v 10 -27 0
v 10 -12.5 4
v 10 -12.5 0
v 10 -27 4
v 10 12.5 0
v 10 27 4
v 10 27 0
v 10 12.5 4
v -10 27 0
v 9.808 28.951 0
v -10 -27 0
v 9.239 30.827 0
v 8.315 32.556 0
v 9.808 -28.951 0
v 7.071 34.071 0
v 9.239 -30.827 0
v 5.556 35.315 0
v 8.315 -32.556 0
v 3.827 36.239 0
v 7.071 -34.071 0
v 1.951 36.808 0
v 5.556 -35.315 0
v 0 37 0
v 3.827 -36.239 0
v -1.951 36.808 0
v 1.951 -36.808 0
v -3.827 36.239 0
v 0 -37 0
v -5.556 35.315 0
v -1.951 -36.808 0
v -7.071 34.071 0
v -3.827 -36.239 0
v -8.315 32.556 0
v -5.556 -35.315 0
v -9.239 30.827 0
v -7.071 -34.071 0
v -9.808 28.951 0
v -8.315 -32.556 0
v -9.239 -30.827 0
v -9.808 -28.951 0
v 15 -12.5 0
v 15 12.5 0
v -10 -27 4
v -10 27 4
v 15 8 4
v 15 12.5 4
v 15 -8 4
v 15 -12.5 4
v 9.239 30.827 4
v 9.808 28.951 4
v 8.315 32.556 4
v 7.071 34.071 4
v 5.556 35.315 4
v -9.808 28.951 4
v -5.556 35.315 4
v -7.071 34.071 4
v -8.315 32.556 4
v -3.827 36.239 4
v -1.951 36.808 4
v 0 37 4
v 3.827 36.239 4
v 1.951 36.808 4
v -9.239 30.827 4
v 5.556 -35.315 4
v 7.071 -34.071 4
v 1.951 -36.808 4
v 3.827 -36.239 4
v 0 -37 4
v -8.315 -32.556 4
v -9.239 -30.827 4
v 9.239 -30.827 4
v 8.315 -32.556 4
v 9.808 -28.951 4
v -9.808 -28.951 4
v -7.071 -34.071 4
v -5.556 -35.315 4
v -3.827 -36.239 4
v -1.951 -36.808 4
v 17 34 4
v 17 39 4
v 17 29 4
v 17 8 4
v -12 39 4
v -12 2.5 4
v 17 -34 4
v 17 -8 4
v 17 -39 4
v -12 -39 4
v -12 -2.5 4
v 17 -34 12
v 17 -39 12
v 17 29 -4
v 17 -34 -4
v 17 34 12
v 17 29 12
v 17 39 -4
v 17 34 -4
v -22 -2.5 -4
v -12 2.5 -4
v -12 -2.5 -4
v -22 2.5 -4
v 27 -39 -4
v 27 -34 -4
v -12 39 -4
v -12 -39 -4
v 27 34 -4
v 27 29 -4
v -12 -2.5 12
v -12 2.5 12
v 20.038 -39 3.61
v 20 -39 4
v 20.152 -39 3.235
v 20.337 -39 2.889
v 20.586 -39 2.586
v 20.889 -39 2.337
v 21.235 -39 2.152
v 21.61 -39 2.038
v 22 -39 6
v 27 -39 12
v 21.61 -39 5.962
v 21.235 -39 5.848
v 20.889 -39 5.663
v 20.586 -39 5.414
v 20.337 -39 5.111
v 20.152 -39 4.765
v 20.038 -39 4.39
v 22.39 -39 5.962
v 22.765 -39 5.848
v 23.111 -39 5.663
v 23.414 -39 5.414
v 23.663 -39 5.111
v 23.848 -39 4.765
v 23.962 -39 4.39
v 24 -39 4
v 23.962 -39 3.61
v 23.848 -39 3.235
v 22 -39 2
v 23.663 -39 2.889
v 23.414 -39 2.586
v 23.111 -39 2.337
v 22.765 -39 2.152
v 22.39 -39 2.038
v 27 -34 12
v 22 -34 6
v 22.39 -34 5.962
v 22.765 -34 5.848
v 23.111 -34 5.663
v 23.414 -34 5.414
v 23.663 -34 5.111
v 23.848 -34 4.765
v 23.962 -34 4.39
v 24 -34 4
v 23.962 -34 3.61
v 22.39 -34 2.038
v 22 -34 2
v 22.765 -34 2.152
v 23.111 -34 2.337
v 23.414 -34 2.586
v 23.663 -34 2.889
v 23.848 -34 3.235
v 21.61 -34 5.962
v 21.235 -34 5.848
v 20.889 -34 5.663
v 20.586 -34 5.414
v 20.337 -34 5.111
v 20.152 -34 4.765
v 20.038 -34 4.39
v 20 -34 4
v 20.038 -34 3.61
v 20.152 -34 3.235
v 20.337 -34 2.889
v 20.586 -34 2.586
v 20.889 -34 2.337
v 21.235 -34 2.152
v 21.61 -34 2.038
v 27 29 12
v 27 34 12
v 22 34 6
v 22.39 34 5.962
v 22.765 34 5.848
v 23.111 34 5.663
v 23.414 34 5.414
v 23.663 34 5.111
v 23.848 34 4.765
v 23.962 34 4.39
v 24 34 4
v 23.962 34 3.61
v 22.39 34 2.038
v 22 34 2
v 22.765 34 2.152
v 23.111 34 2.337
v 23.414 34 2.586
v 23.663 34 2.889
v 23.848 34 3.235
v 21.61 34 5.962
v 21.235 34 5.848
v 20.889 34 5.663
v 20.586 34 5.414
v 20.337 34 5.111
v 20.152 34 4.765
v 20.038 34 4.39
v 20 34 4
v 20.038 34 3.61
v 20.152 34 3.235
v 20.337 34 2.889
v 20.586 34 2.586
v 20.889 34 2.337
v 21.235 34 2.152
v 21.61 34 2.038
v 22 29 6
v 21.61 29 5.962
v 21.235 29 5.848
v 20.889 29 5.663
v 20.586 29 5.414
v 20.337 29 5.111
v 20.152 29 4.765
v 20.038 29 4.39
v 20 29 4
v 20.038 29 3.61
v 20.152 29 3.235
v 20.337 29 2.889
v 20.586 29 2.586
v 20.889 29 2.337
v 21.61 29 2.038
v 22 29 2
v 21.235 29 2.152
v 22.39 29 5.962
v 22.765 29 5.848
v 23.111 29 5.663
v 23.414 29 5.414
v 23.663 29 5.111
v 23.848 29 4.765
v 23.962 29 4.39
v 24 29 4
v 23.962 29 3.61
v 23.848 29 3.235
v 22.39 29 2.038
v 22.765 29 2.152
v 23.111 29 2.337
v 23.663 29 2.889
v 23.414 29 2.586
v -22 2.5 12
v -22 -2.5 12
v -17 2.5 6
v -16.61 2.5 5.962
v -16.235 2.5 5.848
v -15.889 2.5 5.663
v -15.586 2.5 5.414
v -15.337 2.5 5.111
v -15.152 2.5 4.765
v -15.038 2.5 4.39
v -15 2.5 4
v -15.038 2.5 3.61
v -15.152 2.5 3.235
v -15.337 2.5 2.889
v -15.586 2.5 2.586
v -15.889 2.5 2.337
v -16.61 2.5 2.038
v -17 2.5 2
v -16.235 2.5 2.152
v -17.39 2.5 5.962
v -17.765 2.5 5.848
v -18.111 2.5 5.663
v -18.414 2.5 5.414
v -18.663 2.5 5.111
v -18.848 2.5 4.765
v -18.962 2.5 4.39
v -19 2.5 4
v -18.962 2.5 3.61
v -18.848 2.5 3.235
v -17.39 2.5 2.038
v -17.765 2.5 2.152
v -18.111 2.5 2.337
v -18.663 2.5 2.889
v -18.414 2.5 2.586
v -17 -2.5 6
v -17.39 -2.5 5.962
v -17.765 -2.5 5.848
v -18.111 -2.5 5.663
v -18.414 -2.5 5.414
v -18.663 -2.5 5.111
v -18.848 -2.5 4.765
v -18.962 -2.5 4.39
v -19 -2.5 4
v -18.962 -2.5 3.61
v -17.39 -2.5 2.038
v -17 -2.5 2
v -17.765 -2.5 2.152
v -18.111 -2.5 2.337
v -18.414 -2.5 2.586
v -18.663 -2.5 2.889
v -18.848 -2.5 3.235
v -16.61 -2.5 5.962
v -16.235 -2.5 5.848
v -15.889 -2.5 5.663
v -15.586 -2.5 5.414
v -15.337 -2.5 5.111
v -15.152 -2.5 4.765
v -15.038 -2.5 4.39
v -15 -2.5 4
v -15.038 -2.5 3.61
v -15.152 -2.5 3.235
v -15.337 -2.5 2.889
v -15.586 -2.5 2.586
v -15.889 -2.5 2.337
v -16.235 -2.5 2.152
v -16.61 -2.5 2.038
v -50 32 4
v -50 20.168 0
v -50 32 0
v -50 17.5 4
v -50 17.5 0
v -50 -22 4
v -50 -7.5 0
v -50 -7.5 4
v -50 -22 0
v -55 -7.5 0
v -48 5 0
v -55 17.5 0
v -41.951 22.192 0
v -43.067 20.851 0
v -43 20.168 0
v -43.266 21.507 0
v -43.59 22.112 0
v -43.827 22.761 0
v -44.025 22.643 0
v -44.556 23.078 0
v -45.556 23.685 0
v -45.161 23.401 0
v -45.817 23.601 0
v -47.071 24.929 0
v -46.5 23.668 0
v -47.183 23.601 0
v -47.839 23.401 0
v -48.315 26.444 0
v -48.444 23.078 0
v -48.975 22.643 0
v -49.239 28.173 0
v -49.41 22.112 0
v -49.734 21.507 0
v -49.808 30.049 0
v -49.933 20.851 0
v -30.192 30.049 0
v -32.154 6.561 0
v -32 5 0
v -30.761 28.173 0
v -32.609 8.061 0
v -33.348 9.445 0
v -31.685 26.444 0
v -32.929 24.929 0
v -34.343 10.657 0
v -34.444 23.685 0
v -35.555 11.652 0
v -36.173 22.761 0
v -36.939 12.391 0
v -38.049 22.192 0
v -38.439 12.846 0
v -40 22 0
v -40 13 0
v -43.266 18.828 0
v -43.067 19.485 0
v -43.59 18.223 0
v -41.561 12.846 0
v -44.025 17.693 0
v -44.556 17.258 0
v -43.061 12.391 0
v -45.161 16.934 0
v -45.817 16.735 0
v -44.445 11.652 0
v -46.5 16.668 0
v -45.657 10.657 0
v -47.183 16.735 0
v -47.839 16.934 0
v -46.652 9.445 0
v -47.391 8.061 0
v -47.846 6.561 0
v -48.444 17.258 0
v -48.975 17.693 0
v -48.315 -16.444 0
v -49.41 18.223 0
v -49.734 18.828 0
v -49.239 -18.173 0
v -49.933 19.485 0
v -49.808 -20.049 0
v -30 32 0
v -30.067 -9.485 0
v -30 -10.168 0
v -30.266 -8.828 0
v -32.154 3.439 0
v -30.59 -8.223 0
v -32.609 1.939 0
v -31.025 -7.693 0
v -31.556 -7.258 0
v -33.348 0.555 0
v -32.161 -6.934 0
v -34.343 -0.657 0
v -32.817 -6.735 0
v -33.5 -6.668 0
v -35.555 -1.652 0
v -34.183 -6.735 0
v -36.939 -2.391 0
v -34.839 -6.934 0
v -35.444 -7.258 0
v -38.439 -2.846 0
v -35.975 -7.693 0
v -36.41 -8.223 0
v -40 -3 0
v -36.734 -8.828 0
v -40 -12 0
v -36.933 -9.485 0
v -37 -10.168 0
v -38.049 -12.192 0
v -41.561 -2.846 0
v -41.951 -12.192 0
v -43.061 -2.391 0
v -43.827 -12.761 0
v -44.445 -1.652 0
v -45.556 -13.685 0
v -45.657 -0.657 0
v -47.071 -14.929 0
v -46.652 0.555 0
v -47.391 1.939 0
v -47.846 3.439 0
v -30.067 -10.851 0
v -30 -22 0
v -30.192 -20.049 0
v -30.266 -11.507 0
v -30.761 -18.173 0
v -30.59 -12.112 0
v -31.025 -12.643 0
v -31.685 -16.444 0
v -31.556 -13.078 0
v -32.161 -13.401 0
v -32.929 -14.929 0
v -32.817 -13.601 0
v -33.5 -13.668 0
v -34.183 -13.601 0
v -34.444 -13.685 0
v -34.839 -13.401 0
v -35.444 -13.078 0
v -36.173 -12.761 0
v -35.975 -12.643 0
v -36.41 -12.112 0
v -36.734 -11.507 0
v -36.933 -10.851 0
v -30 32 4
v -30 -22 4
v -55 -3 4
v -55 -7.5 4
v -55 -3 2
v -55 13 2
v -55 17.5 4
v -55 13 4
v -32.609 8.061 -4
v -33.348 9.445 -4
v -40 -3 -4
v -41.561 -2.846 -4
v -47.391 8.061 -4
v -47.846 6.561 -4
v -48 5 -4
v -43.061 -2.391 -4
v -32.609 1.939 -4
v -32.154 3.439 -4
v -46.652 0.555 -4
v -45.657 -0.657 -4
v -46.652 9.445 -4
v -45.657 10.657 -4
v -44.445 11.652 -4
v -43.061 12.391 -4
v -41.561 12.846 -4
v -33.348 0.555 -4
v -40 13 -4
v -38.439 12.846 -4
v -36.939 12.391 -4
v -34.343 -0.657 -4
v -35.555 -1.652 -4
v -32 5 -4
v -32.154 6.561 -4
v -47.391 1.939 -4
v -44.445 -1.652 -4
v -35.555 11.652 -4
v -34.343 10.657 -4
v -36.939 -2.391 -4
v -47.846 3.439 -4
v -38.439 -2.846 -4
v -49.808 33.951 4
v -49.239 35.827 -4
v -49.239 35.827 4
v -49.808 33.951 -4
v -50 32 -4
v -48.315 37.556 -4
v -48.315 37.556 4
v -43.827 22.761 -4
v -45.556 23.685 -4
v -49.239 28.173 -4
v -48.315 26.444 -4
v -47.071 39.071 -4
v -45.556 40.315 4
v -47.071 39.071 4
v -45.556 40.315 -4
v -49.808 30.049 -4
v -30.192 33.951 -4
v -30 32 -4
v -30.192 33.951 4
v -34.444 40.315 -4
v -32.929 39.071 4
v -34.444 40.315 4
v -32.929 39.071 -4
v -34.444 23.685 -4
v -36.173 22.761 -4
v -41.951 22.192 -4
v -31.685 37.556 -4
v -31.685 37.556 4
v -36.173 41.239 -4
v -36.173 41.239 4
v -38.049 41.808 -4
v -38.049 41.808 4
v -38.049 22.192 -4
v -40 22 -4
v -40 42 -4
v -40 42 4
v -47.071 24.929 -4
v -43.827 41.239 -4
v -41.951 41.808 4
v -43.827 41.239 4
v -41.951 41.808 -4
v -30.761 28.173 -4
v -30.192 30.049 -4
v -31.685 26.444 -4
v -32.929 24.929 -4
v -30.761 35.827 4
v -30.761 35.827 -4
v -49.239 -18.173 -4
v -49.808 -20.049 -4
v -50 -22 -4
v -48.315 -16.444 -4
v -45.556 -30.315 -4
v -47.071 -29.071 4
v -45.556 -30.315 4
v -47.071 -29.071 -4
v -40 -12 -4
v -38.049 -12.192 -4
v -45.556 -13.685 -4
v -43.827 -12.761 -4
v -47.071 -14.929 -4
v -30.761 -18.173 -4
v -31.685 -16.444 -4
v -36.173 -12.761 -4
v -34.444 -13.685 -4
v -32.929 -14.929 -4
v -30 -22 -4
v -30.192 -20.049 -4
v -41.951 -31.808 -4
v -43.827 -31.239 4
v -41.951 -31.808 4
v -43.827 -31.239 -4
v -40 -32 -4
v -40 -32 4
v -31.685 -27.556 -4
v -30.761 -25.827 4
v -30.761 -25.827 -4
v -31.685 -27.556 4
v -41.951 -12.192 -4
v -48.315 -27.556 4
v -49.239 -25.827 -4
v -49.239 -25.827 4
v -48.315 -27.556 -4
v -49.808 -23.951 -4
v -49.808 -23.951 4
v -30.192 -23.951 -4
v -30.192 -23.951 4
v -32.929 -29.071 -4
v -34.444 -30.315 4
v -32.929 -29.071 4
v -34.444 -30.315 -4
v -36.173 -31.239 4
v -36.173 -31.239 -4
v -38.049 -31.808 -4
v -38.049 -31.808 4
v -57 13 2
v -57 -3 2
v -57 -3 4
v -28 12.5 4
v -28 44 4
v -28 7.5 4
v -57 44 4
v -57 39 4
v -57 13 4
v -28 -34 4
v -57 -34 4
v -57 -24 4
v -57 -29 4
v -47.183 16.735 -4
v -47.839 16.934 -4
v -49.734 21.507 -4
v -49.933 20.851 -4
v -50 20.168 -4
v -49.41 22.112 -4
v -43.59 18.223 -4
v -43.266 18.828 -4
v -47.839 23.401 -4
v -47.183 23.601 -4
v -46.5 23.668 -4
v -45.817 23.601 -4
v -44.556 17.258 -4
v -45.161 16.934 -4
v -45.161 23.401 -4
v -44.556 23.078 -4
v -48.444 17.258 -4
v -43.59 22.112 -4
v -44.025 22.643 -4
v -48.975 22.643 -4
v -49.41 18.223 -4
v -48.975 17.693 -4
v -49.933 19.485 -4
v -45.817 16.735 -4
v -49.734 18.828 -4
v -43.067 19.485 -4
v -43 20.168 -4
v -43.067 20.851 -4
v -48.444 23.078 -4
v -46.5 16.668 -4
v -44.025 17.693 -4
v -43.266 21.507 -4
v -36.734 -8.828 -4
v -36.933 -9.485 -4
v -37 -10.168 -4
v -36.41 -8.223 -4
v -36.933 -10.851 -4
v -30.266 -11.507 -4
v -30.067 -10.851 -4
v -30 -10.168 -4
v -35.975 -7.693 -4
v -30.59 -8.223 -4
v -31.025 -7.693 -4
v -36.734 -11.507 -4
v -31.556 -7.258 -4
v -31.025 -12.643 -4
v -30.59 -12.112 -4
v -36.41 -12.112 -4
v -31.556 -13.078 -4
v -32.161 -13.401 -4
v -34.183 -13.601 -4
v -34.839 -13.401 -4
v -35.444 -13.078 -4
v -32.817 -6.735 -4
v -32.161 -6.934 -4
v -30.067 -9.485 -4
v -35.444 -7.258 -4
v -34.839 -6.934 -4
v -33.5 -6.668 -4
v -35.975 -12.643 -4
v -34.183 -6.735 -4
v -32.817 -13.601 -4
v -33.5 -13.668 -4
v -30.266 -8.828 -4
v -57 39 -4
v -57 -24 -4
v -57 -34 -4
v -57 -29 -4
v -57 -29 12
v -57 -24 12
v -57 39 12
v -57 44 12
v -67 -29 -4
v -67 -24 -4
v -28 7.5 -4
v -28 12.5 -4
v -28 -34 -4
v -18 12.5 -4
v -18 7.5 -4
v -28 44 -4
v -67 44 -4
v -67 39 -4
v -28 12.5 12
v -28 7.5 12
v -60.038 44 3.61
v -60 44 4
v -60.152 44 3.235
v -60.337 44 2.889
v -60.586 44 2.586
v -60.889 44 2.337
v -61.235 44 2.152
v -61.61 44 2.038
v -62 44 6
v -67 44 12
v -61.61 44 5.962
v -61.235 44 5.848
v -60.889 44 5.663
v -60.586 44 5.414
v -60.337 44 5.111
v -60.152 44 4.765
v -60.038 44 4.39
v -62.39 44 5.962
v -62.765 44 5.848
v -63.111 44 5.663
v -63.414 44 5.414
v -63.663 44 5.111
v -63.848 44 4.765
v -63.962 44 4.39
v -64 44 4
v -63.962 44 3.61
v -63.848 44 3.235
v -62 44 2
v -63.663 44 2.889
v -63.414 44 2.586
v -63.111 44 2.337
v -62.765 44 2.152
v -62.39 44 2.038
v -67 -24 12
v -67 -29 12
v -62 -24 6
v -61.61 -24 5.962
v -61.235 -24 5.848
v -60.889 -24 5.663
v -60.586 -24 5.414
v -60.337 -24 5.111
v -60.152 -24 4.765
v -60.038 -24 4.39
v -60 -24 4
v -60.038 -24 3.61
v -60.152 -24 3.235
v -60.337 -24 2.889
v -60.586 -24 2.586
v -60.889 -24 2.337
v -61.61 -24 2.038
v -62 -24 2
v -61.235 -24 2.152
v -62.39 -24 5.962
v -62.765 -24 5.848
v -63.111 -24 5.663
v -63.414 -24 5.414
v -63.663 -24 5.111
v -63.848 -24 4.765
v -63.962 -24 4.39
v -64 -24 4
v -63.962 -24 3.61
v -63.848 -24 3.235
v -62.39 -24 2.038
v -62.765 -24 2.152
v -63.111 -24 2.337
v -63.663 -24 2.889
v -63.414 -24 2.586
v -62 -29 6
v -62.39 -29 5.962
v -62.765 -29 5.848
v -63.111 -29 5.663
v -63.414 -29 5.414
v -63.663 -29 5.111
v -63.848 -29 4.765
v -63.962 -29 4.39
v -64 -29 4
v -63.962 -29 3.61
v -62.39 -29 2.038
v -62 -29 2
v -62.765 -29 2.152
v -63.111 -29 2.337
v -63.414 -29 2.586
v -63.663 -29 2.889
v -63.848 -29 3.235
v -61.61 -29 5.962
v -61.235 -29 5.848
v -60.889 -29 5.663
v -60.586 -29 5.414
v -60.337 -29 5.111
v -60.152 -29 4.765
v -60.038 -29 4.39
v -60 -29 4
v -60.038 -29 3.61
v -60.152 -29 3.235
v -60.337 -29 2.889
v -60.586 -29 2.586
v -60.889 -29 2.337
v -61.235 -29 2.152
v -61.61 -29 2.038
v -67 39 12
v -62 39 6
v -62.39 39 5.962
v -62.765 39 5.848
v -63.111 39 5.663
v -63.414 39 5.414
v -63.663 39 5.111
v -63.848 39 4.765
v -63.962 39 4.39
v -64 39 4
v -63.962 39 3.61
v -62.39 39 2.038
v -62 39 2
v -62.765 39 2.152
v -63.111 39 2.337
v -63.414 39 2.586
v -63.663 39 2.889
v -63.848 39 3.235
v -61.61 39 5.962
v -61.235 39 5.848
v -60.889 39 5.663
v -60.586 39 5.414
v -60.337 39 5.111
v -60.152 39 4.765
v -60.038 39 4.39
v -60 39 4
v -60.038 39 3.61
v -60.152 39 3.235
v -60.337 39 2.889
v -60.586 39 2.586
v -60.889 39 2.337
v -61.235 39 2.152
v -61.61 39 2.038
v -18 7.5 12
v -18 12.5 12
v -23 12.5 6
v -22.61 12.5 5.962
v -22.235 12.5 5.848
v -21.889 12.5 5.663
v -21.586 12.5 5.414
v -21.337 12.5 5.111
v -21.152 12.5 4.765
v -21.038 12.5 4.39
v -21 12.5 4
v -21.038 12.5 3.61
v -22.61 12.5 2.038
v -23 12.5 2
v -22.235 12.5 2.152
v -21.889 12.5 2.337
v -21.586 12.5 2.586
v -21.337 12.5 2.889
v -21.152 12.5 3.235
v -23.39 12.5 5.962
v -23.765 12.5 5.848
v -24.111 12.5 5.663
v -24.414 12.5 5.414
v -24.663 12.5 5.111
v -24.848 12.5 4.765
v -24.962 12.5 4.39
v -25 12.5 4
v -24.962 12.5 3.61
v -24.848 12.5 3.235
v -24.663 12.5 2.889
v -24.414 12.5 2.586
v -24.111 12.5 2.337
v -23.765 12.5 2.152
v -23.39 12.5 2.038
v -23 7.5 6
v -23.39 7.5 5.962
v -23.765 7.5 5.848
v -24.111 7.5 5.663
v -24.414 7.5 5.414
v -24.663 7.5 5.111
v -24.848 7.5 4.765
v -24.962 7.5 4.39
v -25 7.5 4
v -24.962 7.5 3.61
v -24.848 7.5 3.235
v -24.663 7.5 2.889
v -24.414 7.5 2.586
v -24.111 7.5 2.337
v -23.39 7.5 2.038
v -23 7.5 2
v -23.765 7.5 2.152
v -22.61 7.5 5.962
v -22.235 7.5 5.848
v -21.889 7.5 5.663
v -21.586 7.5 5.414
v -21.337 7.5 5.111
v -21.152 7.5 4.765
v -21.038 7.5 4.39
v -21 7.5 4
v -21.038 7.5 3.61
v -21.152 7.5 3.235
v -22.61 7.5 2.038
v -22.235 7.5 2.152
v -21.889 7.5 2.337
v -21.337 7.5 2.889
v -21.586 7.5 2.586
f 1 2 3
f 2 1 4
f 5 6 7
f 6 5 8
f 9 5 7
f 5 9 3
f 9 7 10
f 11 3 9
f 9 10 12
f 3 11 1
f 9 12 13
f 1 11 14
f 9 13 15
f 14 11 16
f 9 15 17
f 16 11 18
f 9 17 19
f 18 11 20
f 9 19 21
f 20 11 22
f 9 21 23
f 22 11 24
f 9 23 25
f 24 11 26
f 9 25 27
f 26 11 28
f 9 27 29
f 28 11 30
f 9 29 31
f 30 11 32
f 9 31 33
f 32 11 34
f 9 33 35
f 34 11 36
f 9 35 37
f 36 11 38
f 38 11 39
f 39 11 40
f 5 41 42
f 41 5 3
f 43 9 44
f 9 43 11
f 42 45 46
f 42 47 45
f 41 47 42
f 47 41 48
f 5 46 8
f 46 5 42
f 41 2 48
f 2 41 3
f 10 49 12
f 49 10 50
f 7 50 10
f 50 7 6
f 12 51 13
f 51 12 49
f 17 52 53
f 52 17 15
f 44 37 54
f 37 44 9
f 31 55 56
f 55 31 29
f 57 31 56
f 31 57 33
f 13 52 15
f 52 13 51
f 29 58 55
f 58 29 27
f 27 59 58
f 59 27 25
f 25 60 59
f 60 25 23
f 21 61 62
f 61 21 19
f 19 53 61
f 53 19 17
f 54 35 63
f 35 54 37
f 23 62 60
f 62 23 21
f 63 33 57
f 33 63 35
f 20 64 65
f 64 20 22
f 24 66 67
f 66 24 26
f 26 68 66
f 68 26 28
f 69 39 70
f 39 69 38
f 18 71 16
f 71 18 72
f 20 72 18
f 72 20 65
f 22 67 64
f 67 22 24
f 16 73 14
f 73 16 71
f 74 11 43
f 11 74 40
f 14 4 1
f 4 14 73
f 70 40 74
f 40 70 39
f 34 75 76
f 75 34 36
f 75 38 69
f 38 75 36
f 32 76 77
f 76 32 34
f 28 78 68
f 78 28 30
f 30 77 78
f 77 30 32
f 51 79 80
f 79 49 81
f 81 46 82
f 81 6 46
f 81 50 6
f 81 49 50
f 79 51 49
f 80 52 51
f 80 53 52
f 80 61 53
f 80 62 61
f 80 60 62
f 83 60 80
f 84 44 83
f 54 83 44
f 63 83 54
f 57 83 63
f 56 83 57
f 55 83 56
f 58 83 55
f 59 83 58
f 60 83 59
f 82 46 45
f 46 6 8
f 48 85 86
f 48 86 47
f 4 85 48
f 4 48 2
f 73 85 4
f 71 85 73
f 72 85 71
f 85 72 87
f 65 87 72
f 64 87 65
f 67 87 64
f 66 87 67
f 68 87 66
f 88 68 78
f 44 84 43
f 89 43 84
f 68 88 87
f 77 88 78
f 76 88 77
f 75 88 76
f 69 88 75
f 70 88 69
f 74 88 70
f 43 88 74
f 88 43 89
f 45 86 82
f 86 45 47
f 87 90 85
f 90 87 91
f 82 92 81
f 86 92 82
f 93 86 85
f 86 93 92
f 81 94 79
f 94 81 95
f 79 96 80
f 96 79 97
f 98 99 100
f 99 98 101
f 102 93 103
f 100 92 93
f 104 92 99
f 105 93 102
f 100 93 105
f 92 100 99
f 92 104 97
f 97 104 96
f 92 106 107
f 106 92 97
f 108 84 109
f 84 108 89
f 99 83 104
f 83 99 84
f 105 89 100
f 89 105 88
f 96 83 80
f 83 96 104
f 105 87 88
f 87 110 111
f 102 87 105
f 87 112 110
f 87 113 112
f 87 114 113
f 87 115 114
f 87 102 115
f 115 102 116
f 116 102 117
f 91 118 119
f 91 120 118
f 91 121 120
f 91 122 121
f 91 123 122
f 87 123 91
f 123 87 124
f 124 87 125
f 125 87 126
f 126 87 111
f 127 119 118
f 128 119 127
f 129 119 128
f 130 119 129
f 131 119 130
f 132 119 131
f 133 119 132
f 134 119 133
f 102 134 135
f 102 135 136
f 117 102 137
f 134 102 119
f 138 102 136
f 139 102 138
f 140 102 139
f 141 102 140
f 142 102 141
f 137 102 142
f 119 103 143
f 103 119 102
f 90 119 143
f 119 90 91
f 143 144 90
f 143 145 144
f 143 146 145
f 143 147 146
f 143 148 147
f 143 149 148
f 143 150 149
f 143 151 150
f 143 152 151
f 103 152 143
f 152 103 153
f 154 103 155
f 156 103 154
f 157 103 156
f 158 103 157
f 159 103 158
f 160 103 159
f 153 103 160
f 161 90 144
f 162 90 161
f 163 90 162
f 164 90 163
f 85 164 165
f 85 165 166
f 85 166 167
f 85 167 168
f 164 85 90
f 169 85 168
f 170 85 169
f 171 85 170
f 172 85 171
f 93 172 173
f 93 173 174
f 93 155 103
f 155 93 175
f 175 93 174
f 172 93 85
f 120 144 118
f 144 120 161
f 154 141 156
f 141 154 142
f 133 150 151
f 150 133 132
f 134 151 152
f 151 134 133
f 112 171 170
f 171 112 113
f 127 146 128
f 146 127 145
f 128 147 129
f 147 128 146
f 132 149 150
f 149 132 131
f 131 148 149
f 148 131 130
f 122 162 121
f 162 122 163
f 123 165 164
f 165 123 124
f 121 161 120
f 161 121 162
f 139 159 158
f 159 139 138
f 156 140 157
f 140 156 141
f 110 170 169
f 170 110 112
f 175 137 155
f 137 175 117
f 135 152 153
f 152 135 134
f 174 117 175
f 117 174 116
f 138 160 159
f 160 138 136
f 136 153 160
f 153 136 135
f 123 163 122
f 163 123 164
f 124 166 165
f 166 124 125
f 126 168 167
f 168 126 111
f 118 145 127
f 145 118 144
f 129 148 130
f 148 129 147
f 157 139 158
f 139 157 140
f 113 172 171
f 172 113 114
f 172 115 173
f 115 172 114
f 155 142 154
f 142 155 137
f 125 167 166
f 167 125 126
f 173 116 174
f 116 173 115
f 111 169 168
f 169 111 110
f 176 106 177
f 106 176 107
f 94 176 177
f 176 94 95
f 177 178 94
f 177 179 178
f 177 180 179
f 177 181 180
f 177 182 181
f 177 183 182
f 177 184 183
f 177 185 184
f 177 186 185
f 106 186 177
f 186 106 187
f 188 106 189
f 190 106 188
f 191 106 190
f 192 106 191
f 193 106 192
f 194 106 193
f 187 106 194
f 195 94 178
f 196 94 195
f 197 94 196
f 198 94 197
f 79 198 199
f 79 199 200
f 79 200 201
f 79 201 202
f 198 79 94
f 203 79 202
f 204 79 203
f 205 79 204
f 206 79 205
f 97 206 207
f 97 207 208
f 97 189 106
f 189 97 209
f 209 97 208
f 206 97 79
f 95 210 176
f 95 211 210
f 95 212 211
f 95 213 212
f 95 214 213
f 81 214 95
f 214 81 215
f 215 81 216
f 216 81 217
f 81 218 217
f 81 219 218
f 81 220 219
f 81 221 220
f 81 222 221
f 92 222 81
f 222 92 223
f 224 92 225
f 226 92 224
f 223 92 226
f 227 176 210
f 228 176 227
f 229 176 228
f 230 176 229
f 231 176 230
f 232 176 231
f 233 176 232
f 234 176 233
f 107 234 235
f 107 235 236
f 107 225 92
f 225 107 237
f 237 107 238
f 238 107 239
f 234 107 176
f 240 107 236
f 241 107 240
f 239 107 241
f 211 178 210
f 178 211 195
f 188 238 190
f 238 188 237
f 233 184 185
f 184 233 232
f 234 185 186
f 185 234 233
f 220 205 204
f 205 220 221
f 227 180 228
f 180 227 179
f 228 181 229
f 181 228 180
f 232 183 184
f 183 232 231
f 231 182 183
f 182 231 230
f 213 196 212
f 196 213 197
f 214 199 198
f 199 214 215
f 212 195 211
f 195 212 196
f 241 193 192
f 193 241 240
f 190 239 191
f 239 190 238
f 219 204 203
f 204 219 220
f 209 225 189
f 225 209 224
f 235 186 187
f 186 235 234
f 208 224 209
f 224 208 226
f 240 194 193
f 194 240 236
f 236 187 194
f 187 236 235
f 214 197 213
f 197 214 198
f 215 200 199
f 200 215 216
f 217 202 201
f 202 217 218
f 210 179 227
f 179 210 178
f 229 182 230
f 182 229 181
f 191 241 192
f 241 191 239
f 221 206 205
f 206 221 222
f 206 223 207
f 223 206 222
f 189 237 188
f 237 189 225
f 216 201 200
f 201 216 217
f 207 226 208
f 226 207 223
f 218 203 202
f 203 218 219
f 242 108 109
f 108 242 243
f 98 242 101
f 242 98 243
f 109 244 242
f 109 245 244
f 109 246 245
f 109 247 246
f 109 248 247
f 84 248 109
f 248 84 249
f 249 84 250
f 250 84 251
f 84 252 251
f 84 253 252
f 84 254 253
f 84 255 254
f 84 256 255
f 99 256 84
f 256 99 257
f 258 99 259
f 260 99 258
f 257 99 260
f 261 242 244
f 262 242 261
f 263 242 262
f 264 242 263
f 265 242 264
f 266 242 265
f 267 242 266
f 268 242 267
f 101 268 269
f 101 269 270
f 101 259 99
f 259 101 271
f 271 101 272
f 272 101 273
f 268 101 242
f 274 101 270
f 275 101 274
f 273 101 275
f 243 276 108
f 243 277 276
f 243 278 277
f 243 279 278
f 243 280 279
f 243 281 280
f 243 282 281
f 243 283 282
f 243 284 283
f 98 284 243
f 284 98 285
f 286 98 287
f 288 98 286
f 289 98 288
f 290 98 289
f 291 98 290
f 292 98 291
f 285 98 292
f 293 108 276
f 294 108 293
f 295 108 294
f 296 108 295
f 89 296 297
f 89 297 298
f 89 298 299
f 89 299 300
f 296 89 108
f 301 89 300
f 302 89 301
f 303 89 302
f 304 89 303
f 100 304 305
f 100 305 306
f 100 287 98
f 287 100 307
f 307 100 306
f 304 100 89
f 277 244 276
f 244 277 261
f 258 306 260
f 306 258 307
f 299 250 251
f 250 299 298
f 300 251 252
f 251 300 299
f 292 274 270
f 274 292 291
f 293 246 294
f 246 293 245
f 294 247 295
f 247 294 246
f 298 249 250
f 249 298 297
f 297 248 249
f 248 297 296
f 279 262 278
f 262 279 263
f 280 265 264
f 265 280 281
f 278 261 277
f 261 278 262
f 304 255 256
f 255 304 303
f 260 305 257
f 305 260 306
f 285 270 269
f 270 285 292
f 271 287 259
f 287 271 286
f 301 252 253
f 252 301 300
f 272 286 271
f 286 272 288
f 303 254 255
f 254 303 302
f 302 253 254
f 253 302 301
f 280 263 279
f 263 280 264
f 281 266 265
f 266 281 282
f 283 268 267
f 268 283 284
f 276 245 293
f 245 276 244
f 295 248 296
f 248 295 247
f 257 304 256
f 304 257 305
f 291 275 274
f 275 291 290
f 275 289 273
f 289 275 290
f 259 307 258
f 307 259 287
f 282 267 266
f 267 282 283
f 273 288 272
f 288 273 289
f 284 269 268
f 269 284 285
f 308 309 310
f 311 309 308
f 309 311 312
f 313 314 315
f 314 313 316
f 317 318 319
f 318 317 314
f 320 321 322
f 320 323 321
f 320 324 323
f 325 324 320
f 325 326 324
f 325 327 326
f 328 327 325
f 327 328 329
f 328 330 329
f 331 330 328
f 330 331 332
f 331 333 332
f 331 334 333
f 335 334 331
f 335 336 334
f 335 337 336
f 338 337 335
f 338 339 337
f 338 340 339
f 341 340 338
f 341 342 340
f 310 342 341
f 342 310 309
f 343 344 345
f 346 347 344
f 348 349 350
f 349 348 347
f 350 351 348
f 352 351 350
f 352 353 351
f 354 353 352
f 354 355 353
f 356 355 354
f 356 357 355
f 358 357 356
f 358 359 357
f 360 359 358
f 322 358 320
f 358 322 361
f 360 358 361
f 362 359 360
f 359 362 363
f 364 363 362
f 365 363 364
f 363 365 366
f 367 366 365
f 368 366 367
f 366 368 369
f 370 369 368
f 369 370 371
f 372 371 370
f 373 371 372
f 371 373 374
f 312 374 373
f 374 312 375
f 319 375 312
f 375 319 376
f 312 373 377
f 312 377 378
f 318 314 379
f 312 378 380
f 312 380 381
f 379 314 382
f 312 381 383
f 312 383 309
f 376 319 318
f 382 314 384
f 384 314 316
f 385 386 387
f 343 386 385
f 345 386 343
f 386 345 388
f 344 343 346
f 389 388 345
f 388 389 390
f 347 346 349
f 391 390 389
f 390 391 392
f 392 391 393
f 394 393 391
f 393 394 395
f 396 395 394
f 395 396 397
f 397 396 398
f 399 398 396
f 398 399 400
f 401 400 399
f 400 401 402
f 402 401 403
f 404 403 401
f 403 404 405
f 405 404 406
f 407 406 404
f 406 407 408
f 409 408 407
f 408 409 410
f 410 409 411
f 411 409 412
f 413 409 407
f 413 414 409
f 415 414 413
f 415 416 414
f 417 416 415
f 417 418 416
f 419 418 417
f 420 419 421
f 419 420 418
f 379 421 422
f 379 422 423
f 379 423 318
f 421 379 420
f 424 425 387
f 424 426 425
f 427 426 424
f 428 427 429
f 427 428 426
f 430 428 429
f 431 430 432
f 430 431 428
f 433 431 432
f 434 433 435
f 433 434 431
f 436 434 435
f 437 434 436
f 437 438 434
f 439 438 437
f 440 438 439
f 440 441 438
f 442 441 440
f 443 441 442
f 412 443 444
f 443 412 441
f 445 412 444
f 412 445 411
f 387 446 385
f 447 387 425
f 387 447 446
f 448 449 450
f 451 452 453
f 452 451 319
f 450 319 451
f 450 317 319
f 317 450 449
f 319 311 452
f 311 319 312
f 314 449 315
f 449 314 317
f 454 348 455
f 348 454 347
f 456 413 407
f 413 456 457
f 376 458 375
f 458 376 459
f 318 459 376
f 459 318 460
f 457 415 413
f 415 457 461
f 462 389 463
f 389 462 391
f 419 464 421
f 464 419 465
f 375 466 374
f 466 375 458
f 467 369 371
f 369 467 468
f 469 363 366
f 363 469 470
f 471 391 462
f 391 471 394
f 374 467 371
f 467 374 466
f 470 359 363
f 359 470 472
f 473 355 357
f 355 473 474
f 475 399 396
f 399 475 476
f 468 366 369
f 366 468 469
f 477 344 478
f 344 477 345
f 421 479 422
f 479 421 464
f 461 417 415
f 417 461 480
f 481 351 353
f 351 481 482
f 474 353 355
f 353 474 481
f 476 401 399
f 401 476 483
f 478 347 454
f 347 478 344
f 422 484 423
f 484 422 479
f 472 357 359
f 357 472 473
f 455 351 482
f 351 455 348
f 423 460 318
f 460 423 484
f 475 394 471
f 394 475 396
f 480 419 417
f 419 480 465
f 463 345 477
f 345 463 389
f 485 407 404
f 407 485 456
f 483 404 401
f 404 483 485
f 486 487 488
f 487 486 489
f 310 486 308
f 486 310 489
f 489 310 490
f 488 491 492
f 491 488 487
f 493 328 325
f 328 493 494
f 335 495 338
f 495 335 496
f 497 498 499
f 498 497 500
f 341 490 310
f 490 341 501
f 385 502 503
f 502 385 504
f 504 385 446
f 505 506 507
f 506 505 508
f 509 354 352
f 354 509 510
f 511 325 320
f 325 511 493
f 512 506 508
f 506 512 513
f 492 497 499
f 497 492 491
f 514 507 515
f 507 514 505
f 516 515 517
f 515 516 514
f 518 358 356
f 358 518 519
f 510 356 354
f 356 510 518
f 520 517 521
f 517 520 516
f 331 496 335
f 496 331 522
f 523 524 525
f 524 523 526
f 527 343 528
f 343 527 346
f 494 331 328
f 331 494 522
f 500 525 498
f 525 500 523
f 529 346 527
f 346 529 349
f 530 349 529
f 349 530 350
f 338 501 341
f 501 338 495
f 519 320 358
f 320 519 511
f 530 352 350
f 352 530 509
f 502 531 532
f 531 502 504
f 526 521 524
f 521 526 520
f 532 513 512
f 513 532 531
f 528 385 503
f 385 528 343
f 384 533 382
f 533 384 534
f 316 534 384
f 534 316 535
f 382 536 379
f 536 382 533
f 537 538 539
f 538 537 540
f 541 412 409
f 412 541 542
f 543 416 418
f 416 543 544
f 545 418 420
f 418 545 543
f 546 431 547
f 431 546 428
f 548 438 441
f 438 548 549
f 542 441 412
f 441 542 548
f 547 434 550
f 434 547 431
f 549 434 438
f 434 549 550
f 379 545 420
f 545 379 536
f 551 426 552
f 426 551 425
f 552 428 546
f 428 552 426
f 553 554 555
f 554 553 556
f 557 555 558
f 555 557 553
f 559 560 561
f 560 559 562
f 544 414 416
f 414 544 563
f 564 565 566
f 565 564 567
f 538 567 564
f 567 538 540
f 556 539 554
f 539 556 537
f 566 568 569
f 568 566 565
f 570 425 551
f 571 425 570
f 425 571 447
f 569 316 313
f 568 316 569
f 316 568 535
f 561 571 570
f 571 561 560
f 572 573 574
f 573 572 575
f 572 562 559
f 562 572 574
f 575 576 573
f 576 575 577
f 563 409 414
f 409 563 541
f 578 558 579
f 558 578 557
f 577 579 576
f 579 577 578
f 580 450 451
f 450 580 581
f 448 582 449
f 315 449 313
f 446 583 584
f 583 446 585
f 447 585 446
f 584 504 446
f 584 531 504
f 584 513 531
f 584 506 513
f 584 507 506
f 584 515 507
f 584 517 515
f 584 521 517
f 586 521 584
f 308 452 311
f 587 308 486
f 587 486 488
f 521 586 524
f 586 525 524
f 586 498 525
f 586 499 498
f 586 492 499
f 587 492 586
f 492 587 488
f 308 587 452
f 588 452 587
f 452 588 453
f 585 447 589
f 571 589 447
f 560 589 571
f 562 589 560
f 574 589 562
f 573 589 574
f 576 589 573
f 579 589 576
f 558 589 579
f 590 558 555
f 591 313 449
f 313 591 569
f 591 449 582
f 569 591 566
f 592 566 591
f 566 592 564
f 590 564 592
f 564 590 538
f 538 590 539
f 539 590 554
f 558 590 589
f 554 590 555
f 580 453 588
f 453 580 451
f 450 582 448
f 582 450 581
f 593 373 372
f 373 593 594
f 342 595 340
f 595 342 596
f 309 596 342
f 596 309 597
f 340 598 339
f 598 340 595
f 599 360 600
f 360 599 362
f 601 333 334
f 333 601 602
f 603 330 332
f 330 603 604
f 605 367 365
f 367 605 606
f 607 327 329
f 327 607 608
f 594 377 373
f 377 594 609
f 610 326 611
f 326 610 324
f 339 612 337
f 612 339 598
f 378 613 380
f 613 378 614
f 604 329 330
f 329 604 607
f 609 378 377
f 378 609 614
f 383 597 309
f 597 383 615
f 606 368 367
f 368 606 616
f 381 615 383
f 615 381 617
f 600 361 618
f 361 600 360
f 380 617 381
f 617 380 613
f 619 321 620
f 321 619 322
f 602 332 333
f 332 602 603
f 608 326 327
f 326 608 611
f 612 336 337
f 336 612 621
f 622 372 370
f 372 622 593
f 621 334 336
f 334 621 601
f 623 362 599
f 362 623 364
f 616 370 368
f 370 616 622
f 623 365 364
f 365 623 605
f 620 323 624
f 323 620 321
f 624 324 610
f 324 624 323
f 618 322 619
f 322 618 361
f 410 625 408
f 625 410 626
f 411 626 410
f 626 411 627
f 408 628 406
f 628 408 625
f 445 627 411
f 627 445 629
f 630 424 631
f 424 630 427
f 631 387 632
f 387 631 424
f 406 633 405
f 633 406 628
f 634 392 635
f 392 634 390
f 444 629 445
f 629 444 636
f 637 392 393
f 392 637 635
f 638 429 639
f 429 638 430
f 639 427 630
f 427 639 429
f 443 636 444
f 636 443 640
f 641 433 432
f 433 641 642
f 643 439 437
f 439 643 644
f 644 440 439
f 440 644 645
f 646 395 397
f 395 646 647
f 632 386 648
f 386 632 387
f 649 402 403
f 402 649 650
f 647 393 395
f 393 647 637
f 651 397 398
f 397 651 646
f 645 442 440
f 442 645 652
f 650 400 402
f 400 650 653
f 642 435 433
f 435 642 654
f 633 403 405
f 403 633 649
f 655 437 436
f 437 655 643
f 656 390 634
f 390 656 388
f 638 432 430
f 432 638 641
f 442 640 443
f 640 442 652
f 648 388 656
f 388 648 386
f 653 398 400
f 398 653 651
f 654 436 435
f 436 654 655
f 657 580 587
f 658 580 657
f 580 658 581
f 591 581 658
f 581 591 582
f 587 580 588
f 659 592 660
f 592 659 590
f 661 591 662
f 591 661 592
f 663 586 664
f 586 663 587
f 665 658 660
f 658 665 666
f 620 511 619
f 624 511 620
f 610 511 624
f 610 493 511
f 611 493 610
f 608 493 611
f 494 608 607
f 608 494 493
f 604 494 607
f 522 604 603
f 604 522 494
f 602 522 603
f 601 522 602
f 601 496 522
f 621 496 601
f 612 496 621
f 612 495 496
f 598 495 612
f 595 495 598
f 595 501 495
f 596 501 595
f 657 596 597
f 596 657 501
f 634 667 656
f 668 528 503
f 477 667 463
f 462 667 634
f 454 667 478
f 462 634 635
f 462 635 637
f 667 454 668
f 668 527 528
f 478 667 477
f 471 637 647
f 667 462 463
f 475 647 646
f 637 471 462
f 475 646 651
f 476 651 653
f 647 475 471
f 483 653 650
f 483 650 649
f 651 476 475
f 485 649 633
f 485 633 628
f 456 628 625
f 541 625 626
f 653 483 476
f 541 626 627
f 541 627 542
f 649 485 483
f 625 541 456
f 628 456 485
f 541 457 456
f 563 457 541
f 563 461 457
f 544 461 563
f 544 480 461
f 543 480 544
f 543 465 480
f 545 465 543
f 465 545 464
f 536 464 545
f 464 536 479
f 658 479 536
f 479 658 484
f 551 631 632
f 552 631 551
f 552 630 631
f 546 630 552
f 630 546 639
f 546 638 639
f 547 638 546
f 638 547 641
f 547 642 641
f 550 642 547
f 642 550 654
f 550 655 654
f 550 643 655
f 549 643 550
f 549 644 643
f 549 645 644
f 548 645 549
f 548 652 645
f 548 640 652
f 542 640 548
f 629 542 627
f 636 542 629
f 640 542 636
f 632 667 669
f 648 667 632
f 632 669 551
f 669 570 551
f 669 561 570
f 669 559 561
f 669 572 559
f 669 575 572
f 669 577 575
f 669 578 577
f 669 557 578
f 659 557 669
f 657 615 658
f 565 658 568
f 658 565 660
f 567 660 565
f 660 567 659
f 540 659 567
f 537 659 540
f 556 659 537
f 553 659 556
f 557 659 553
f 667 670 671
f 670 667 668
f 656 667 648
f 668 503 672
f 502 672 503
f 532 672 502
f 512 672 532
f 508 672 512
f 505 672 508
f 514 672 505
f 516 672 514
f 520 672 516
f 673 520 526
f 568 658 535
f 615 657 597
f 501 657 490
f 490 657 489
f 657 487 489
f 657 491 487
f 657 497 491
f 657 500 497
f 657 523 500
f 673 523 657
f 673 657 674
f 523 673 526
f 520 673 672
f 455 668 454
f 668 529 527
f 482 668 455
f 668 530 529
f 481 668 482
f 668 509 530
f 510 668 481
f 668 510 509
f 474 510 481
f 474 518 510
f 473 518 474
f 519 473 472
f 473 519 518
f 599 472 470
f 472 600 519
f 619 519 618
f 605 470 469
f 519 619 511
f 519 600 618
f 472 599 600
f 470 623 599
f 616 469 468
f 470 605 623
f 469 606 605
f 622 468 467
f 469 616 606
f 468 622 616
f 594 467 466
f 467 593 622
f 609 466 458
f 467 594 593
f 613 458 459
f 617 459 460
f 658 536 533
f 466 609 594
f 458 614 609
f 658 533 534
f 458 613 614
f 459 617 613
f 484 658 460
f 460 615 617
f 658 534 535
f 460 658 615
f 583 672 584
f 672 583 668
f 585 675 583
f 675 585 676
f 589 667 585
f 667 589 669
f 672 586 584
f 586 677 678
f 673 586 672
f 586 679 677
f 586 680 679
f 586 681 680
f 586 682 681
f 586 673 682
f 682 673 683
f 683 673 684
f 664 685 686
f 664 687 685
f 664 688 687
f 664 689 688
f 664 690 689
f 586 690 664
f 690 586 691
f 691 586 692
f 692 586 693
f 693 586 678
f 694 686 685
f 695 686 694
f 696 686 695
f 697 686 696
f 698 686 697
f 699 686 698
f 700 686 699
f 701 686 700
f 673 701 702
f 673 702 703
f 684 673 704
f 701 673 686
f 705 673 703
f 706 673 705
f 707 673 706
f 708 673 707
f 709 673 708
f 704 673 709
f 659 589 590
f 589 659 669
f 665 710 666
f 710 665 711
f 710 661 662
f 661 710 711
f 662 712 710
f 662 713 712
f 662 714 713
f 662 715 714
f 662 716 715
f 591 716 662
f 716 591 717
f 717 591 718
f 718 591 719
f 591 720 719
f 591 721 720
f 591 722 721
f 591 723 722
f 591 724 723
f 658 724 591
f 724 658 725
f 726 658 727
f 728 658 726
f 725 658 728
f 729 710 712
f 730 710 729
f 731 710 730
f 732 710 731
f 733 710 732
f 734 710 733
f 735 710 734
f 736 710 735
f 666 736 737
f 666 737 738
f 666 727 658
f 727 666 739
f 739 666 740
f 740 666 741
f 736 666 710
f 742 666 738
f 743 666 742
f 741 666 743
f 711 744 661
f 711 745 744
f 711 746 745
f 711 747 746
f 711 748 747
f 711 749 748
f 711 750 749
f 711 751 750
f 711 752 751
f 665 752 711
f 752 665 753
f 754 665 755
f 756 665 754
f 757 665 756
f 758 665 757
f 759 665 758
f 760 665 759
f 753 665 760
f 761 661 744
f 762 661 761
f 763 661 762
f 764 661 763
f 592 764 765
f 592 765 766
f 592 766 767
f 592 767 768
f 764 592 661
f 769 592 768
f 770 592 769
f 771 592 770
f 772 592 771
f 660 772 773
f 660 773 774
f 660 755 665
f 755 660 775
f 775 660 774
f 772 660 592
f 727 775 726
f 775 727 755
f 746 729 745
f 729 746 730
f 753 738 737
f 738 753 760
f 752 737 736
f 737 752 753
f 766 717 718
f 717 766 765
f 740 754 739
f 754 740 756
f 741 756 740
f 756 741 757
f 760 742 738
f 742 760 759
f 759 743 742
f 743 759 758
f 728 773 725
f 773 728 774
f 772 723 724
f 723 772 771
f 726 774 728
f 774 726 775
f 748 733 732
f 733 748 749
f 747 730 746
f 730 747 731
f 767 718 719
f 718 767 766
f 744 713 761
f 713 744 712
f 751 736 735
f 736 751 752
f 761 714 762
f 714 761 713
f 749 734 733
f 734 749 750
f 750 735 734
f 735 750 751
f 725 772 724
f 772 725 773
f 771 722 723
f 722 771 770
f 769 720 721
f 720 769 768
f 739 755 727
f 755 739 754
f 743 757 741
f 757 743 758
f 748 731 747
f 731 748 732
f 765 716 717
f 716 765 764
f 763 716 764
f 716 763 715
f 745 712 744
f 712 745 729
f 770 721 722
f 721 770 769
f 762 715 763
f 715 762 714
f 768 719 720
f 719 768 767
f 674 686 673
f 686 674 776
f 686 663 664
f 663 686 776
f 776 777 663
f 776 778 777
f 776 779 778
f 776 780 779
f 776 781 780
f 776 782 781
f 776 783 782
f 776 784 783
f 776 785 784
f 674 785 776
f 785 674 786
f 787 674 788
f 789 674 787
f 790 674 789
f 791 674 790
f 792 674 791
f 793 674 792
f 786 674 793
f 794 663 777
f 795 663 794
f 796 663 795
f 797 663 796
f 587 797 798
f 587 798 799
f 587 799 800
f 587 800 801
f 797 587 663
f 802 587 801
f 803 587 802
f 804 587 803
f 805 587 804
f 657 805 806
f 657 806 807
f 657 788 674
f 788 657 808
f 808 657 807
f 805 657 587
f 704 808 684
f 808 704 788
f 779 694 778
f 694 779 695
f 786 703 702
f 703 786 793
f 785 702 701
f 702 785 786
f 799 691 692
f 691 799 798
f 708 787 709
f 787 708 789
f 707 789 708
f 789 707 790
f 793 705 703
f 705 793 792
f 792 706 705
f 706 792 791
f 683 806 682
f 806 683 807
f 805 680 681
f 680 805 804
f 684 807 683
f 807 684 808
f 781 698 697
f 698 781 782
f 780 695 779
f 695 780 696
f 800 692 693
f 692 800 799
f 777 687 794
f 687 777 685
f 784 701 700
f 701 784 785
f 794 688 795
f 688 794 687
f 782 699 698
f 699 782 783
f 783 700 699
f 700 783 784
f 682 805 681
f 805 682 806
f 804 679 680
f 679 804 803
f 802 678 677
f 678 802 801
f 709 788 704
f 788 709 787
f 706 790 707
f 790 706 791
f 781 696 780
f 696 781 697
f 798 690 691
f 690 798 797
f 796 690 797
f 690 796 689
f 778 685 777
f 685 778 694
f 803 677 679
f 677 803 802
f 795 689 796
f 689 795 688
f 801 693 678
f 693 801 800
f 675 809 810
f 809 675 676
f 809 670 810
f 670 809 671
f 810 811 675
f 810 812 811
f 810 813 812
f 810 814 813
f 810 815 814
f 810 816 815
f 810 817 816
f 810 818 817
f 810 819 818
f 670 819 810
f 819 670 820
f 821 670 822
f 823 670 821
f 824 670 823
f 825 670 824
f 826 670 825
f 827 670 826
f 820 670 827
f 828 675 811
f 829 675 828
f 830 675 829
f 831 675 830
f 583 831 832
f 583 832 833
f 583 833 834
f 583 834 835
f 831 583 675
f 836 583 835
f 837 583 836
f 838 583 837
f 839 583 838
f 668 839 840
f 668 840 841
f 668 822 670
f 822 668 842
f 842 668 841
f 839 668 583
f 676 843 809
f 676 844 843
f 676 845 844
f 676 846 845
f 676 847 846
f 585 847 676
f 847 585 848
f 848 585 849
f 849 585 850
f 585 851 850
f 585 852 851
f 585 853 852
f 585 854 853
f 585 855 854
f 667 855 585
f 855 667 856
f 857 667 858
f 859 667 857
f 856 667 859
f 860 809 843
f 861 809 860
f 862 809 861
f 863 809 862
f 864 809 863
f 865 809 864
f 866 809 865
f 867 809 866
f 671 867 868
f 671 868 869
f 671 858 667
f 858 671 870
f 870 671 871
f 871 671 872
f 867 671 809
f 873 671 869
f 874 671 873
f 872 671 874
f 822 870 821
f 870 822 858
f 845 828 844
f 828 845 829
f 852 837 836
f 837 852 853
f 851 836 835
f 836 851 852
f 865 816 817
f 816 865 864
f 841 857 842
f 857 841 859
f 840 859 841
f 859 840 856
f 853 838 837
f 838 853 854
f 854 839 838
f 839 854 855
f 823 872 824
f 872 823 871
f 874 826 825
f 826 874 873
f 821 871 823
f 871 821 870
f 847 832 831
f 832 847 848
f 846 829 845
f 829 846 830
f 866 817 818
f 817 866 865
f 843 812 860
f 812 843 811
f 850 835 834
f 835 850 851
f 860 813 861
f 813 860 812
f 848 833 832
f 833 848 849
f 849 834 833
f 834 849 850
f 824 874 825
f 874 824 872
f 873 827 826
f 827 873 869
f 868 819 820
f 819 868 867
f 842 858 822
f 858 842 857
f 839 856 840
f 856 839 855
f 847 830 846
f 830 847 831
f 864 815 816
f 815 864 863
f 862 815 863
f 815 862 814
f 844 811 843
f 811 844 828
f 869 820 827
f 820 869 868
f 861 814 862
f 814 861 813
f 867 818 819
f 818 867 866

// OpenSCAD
IN_MM = 25.4;
$fn=32;

wall_th = 2;
bowl_r = 3 * IN_MM; // TODO: measure
bowl_h = 3 * IN_MM; // TODO: measure
module food_bowl() {
    cylinder(r=bowl_r, h=bowl_h);
}

enclosure_th = 3;
enclosure_axle_r = 2;
sphere_r = sqrt(bowl_r * bowl_r + bowl_h * bowl_h) + enclosure_th;
enclosure_pivot_offset = 2 * sphere_r - enclosure_th - enclosure_axle_r;
enclosure_offset = [-enclosure_pivot_offset, 0, -sphere_r/4];
module enclosure() {
    difference() {
        union() {
            sphere(r=sphere_r + enclosure_th);
            translate([sphere_r, sphere_r/2, sphere_r/4])
                cube(
                    [2*sphere_r, enclosure_th, sphere_r/2],
                    center=true);
            translate([sphere_r, -sphere_r/2, sphere_r/4])
                cube(
                    [2*sphere_r, enclosure_th, sphere_r/2],
                    center=true);
        }
        sphere(r=sphere_r);
        translate([0, 0, -sphere_r / 2 - enclosure_th])
            cube([
                2 * (sphere_r + enclosure_th), 
                2 * (sphere_r + enclosure_th), 
                sphere_r + enclosure_th * 2], 
                center=true);
        translate([
            enclosure_pivot_offset,
            0,
            sphere_r / 4])
            rotate([90, 0, 0])
                cylinder(r=enclosure_axle_r, h=2*sphere_r, center=true);
    }
}

module servo() {
    
}

module rpi() {
    import("Raspberry_Pi_3_Light_Version.STL");
}

camera_l = 20; // parallel to ribbon
camera_w = 74;
camera_h = 30; // back of board to tip of lens
camera_lens_r = 16/2;
cam_board_th = 8;
ribbon_offset = 5;
ribbon_tab_w = 25;
ribbon_tab_l = 5;
ribbon_w = 16;
ribbon_l = 20;
ribbon_h = 2;
ir_h = 20;
ir_or = camera_l / 2;
sensor_or = 7 / 2;
sensor_h = 14;
tab_w = 5;

cam_enc_l = camera_l + ribbon_tab_l + 2 * wall_th;
cam_enc_w = camera_w + 2 * wall_th;

module camera() {
    translate([0, 0, cam_board_th/2])
        cube([camera_l, camera_w - camera_l, cam_board_th], center=true);
    translate([camera_l / 2 + ribbon_tab_l / 2, 0, cam_board_th/2])
        cube([ribbon_tab_l, ribbon_tab_w, cam_board_th], center=true);
    translate([0, 0, 0])
        cylinder(r=camera_lens_r, h=camera_h);
    translate([0, camera_w / 2 - camera_l / 2, 0])
        cylinder(r=camera_l/2, h=ir_h);
    translate([0, -camera_w / 2 + camera_l / 2, 0])
        cylinder(r=camera_l/2, h=ir_h);
    # translate([camera_l / 2 + ribbon_l / 2, 0, ribbon_offset])
        cube([ribbon_l, ribbon_w, ribbon_h], center=true);
    translate([camera_l / 2 - sensor_or, camera_w / 2 - ir_or - sqrt(4*ir_or*sensor_or), 0])
        cylinder(r=sensor_or, h=sensor_h);
    translate([-camera_l / 2 + sensor_or, -camera_w / 2 + ir_or + sqrt(4*ir_or*sensor_or), 0])
        cylinder(r=sensor_or, h=sensor_h);
    * camera_holes();
}
module camera_holes() {
    for (side=[1, -1]) {
        for (l=camera_hole_offsets_l) {
            translate([l - camera_l / 2, side * (camera_w / 2 - camera_hole_offset_w), 0]) {
                cylinder(r=camera_hole_or, h=2*camera_h, center=true);
            }
        }
    }
    
    translate([-camera_l / 2 - ribbon_l / 2, 0, ribbon_offset])
        cube([ribbon_l, ribbon_w, ribbon_h], center=true);
}

cam_hinge_or = 4/2;

module hinge_tab() {
    difference() {
        union() {
            cube([2 * tab_w, tab_w, 2 * cam_board_th]);
        }
        
        translate([tab_w, 0, cam_board_th])
            rotate([90, 0, 0])
            cylinder(r=cam_hinge_or, h=camera_w, center=true);
    }
}

module cam_enc_bottom() {
    difference() {
        translate([ribbon_tab_l / 2, 0, 0])
            cube([cam_enc_l, cam_enc_w, cam_board_th], center=true);
        
        # camera();
    }
    translate([cam_enc_l / 2 + ribbon_tab_l / 2, -cam_enc_w/2, -cam_board_th/2])
        hinge_tab();
    translate([cam_enc_l / 2 + ribbon_tab_l / 2, cam_enc_w/2 - 2 * tab_w, -cam_board_th/2])
        hinge_tab();
    translate([-cam_enc_l / 2 + ribbon_tab_l / 2 - 2*tab_w, -tab_w / 2, -cam_board_th/2])
        hinge_tab();
}

module cam_enc_top() {
    difference() {
        translate([ribbon_tab_l / 2, 0, cam_board_th])
            cube([cam_enc_l, cam_enc_w, cam_board_th], center=true);
        # camera();
    }
    translate([cam_enc_l / 2 + ribbon_tab_l / 2, -cam_enc_w/2 + tab_w, -cam_board_th/2])
        hinge_tab();
    translate([cam_enc_l / 2 + ribbon_tab_l / 2, cam_enc_w/2 - tab_w, -cam_board_th/2])
        hinge_tab();
    translate([-cam_enc_l / 2 + ribbon_tab_l / 2 - 2*tab_w, +tab_w / 2, -cam_board_th/2])
        hinge_tab();
}

module cam_enclosure() {
    cam_enc_bottom();
    cam_enc_top();
}

% translate([0, 0, 50])
    cam_enclosure();

translate([-40, 5, cam_board_th])
    rotate([0, 180, 0])
        cam_enc_top();
cam_enc_bottom();

module animated_enclosure() {
    % translate(enclosure_offset)
        food_bowl();
    rotate([0, abs(90 - $t * 180), 0])
        translate(enclosure_offset) {
            enclosure();
        }
}
* animated_enclosure();
